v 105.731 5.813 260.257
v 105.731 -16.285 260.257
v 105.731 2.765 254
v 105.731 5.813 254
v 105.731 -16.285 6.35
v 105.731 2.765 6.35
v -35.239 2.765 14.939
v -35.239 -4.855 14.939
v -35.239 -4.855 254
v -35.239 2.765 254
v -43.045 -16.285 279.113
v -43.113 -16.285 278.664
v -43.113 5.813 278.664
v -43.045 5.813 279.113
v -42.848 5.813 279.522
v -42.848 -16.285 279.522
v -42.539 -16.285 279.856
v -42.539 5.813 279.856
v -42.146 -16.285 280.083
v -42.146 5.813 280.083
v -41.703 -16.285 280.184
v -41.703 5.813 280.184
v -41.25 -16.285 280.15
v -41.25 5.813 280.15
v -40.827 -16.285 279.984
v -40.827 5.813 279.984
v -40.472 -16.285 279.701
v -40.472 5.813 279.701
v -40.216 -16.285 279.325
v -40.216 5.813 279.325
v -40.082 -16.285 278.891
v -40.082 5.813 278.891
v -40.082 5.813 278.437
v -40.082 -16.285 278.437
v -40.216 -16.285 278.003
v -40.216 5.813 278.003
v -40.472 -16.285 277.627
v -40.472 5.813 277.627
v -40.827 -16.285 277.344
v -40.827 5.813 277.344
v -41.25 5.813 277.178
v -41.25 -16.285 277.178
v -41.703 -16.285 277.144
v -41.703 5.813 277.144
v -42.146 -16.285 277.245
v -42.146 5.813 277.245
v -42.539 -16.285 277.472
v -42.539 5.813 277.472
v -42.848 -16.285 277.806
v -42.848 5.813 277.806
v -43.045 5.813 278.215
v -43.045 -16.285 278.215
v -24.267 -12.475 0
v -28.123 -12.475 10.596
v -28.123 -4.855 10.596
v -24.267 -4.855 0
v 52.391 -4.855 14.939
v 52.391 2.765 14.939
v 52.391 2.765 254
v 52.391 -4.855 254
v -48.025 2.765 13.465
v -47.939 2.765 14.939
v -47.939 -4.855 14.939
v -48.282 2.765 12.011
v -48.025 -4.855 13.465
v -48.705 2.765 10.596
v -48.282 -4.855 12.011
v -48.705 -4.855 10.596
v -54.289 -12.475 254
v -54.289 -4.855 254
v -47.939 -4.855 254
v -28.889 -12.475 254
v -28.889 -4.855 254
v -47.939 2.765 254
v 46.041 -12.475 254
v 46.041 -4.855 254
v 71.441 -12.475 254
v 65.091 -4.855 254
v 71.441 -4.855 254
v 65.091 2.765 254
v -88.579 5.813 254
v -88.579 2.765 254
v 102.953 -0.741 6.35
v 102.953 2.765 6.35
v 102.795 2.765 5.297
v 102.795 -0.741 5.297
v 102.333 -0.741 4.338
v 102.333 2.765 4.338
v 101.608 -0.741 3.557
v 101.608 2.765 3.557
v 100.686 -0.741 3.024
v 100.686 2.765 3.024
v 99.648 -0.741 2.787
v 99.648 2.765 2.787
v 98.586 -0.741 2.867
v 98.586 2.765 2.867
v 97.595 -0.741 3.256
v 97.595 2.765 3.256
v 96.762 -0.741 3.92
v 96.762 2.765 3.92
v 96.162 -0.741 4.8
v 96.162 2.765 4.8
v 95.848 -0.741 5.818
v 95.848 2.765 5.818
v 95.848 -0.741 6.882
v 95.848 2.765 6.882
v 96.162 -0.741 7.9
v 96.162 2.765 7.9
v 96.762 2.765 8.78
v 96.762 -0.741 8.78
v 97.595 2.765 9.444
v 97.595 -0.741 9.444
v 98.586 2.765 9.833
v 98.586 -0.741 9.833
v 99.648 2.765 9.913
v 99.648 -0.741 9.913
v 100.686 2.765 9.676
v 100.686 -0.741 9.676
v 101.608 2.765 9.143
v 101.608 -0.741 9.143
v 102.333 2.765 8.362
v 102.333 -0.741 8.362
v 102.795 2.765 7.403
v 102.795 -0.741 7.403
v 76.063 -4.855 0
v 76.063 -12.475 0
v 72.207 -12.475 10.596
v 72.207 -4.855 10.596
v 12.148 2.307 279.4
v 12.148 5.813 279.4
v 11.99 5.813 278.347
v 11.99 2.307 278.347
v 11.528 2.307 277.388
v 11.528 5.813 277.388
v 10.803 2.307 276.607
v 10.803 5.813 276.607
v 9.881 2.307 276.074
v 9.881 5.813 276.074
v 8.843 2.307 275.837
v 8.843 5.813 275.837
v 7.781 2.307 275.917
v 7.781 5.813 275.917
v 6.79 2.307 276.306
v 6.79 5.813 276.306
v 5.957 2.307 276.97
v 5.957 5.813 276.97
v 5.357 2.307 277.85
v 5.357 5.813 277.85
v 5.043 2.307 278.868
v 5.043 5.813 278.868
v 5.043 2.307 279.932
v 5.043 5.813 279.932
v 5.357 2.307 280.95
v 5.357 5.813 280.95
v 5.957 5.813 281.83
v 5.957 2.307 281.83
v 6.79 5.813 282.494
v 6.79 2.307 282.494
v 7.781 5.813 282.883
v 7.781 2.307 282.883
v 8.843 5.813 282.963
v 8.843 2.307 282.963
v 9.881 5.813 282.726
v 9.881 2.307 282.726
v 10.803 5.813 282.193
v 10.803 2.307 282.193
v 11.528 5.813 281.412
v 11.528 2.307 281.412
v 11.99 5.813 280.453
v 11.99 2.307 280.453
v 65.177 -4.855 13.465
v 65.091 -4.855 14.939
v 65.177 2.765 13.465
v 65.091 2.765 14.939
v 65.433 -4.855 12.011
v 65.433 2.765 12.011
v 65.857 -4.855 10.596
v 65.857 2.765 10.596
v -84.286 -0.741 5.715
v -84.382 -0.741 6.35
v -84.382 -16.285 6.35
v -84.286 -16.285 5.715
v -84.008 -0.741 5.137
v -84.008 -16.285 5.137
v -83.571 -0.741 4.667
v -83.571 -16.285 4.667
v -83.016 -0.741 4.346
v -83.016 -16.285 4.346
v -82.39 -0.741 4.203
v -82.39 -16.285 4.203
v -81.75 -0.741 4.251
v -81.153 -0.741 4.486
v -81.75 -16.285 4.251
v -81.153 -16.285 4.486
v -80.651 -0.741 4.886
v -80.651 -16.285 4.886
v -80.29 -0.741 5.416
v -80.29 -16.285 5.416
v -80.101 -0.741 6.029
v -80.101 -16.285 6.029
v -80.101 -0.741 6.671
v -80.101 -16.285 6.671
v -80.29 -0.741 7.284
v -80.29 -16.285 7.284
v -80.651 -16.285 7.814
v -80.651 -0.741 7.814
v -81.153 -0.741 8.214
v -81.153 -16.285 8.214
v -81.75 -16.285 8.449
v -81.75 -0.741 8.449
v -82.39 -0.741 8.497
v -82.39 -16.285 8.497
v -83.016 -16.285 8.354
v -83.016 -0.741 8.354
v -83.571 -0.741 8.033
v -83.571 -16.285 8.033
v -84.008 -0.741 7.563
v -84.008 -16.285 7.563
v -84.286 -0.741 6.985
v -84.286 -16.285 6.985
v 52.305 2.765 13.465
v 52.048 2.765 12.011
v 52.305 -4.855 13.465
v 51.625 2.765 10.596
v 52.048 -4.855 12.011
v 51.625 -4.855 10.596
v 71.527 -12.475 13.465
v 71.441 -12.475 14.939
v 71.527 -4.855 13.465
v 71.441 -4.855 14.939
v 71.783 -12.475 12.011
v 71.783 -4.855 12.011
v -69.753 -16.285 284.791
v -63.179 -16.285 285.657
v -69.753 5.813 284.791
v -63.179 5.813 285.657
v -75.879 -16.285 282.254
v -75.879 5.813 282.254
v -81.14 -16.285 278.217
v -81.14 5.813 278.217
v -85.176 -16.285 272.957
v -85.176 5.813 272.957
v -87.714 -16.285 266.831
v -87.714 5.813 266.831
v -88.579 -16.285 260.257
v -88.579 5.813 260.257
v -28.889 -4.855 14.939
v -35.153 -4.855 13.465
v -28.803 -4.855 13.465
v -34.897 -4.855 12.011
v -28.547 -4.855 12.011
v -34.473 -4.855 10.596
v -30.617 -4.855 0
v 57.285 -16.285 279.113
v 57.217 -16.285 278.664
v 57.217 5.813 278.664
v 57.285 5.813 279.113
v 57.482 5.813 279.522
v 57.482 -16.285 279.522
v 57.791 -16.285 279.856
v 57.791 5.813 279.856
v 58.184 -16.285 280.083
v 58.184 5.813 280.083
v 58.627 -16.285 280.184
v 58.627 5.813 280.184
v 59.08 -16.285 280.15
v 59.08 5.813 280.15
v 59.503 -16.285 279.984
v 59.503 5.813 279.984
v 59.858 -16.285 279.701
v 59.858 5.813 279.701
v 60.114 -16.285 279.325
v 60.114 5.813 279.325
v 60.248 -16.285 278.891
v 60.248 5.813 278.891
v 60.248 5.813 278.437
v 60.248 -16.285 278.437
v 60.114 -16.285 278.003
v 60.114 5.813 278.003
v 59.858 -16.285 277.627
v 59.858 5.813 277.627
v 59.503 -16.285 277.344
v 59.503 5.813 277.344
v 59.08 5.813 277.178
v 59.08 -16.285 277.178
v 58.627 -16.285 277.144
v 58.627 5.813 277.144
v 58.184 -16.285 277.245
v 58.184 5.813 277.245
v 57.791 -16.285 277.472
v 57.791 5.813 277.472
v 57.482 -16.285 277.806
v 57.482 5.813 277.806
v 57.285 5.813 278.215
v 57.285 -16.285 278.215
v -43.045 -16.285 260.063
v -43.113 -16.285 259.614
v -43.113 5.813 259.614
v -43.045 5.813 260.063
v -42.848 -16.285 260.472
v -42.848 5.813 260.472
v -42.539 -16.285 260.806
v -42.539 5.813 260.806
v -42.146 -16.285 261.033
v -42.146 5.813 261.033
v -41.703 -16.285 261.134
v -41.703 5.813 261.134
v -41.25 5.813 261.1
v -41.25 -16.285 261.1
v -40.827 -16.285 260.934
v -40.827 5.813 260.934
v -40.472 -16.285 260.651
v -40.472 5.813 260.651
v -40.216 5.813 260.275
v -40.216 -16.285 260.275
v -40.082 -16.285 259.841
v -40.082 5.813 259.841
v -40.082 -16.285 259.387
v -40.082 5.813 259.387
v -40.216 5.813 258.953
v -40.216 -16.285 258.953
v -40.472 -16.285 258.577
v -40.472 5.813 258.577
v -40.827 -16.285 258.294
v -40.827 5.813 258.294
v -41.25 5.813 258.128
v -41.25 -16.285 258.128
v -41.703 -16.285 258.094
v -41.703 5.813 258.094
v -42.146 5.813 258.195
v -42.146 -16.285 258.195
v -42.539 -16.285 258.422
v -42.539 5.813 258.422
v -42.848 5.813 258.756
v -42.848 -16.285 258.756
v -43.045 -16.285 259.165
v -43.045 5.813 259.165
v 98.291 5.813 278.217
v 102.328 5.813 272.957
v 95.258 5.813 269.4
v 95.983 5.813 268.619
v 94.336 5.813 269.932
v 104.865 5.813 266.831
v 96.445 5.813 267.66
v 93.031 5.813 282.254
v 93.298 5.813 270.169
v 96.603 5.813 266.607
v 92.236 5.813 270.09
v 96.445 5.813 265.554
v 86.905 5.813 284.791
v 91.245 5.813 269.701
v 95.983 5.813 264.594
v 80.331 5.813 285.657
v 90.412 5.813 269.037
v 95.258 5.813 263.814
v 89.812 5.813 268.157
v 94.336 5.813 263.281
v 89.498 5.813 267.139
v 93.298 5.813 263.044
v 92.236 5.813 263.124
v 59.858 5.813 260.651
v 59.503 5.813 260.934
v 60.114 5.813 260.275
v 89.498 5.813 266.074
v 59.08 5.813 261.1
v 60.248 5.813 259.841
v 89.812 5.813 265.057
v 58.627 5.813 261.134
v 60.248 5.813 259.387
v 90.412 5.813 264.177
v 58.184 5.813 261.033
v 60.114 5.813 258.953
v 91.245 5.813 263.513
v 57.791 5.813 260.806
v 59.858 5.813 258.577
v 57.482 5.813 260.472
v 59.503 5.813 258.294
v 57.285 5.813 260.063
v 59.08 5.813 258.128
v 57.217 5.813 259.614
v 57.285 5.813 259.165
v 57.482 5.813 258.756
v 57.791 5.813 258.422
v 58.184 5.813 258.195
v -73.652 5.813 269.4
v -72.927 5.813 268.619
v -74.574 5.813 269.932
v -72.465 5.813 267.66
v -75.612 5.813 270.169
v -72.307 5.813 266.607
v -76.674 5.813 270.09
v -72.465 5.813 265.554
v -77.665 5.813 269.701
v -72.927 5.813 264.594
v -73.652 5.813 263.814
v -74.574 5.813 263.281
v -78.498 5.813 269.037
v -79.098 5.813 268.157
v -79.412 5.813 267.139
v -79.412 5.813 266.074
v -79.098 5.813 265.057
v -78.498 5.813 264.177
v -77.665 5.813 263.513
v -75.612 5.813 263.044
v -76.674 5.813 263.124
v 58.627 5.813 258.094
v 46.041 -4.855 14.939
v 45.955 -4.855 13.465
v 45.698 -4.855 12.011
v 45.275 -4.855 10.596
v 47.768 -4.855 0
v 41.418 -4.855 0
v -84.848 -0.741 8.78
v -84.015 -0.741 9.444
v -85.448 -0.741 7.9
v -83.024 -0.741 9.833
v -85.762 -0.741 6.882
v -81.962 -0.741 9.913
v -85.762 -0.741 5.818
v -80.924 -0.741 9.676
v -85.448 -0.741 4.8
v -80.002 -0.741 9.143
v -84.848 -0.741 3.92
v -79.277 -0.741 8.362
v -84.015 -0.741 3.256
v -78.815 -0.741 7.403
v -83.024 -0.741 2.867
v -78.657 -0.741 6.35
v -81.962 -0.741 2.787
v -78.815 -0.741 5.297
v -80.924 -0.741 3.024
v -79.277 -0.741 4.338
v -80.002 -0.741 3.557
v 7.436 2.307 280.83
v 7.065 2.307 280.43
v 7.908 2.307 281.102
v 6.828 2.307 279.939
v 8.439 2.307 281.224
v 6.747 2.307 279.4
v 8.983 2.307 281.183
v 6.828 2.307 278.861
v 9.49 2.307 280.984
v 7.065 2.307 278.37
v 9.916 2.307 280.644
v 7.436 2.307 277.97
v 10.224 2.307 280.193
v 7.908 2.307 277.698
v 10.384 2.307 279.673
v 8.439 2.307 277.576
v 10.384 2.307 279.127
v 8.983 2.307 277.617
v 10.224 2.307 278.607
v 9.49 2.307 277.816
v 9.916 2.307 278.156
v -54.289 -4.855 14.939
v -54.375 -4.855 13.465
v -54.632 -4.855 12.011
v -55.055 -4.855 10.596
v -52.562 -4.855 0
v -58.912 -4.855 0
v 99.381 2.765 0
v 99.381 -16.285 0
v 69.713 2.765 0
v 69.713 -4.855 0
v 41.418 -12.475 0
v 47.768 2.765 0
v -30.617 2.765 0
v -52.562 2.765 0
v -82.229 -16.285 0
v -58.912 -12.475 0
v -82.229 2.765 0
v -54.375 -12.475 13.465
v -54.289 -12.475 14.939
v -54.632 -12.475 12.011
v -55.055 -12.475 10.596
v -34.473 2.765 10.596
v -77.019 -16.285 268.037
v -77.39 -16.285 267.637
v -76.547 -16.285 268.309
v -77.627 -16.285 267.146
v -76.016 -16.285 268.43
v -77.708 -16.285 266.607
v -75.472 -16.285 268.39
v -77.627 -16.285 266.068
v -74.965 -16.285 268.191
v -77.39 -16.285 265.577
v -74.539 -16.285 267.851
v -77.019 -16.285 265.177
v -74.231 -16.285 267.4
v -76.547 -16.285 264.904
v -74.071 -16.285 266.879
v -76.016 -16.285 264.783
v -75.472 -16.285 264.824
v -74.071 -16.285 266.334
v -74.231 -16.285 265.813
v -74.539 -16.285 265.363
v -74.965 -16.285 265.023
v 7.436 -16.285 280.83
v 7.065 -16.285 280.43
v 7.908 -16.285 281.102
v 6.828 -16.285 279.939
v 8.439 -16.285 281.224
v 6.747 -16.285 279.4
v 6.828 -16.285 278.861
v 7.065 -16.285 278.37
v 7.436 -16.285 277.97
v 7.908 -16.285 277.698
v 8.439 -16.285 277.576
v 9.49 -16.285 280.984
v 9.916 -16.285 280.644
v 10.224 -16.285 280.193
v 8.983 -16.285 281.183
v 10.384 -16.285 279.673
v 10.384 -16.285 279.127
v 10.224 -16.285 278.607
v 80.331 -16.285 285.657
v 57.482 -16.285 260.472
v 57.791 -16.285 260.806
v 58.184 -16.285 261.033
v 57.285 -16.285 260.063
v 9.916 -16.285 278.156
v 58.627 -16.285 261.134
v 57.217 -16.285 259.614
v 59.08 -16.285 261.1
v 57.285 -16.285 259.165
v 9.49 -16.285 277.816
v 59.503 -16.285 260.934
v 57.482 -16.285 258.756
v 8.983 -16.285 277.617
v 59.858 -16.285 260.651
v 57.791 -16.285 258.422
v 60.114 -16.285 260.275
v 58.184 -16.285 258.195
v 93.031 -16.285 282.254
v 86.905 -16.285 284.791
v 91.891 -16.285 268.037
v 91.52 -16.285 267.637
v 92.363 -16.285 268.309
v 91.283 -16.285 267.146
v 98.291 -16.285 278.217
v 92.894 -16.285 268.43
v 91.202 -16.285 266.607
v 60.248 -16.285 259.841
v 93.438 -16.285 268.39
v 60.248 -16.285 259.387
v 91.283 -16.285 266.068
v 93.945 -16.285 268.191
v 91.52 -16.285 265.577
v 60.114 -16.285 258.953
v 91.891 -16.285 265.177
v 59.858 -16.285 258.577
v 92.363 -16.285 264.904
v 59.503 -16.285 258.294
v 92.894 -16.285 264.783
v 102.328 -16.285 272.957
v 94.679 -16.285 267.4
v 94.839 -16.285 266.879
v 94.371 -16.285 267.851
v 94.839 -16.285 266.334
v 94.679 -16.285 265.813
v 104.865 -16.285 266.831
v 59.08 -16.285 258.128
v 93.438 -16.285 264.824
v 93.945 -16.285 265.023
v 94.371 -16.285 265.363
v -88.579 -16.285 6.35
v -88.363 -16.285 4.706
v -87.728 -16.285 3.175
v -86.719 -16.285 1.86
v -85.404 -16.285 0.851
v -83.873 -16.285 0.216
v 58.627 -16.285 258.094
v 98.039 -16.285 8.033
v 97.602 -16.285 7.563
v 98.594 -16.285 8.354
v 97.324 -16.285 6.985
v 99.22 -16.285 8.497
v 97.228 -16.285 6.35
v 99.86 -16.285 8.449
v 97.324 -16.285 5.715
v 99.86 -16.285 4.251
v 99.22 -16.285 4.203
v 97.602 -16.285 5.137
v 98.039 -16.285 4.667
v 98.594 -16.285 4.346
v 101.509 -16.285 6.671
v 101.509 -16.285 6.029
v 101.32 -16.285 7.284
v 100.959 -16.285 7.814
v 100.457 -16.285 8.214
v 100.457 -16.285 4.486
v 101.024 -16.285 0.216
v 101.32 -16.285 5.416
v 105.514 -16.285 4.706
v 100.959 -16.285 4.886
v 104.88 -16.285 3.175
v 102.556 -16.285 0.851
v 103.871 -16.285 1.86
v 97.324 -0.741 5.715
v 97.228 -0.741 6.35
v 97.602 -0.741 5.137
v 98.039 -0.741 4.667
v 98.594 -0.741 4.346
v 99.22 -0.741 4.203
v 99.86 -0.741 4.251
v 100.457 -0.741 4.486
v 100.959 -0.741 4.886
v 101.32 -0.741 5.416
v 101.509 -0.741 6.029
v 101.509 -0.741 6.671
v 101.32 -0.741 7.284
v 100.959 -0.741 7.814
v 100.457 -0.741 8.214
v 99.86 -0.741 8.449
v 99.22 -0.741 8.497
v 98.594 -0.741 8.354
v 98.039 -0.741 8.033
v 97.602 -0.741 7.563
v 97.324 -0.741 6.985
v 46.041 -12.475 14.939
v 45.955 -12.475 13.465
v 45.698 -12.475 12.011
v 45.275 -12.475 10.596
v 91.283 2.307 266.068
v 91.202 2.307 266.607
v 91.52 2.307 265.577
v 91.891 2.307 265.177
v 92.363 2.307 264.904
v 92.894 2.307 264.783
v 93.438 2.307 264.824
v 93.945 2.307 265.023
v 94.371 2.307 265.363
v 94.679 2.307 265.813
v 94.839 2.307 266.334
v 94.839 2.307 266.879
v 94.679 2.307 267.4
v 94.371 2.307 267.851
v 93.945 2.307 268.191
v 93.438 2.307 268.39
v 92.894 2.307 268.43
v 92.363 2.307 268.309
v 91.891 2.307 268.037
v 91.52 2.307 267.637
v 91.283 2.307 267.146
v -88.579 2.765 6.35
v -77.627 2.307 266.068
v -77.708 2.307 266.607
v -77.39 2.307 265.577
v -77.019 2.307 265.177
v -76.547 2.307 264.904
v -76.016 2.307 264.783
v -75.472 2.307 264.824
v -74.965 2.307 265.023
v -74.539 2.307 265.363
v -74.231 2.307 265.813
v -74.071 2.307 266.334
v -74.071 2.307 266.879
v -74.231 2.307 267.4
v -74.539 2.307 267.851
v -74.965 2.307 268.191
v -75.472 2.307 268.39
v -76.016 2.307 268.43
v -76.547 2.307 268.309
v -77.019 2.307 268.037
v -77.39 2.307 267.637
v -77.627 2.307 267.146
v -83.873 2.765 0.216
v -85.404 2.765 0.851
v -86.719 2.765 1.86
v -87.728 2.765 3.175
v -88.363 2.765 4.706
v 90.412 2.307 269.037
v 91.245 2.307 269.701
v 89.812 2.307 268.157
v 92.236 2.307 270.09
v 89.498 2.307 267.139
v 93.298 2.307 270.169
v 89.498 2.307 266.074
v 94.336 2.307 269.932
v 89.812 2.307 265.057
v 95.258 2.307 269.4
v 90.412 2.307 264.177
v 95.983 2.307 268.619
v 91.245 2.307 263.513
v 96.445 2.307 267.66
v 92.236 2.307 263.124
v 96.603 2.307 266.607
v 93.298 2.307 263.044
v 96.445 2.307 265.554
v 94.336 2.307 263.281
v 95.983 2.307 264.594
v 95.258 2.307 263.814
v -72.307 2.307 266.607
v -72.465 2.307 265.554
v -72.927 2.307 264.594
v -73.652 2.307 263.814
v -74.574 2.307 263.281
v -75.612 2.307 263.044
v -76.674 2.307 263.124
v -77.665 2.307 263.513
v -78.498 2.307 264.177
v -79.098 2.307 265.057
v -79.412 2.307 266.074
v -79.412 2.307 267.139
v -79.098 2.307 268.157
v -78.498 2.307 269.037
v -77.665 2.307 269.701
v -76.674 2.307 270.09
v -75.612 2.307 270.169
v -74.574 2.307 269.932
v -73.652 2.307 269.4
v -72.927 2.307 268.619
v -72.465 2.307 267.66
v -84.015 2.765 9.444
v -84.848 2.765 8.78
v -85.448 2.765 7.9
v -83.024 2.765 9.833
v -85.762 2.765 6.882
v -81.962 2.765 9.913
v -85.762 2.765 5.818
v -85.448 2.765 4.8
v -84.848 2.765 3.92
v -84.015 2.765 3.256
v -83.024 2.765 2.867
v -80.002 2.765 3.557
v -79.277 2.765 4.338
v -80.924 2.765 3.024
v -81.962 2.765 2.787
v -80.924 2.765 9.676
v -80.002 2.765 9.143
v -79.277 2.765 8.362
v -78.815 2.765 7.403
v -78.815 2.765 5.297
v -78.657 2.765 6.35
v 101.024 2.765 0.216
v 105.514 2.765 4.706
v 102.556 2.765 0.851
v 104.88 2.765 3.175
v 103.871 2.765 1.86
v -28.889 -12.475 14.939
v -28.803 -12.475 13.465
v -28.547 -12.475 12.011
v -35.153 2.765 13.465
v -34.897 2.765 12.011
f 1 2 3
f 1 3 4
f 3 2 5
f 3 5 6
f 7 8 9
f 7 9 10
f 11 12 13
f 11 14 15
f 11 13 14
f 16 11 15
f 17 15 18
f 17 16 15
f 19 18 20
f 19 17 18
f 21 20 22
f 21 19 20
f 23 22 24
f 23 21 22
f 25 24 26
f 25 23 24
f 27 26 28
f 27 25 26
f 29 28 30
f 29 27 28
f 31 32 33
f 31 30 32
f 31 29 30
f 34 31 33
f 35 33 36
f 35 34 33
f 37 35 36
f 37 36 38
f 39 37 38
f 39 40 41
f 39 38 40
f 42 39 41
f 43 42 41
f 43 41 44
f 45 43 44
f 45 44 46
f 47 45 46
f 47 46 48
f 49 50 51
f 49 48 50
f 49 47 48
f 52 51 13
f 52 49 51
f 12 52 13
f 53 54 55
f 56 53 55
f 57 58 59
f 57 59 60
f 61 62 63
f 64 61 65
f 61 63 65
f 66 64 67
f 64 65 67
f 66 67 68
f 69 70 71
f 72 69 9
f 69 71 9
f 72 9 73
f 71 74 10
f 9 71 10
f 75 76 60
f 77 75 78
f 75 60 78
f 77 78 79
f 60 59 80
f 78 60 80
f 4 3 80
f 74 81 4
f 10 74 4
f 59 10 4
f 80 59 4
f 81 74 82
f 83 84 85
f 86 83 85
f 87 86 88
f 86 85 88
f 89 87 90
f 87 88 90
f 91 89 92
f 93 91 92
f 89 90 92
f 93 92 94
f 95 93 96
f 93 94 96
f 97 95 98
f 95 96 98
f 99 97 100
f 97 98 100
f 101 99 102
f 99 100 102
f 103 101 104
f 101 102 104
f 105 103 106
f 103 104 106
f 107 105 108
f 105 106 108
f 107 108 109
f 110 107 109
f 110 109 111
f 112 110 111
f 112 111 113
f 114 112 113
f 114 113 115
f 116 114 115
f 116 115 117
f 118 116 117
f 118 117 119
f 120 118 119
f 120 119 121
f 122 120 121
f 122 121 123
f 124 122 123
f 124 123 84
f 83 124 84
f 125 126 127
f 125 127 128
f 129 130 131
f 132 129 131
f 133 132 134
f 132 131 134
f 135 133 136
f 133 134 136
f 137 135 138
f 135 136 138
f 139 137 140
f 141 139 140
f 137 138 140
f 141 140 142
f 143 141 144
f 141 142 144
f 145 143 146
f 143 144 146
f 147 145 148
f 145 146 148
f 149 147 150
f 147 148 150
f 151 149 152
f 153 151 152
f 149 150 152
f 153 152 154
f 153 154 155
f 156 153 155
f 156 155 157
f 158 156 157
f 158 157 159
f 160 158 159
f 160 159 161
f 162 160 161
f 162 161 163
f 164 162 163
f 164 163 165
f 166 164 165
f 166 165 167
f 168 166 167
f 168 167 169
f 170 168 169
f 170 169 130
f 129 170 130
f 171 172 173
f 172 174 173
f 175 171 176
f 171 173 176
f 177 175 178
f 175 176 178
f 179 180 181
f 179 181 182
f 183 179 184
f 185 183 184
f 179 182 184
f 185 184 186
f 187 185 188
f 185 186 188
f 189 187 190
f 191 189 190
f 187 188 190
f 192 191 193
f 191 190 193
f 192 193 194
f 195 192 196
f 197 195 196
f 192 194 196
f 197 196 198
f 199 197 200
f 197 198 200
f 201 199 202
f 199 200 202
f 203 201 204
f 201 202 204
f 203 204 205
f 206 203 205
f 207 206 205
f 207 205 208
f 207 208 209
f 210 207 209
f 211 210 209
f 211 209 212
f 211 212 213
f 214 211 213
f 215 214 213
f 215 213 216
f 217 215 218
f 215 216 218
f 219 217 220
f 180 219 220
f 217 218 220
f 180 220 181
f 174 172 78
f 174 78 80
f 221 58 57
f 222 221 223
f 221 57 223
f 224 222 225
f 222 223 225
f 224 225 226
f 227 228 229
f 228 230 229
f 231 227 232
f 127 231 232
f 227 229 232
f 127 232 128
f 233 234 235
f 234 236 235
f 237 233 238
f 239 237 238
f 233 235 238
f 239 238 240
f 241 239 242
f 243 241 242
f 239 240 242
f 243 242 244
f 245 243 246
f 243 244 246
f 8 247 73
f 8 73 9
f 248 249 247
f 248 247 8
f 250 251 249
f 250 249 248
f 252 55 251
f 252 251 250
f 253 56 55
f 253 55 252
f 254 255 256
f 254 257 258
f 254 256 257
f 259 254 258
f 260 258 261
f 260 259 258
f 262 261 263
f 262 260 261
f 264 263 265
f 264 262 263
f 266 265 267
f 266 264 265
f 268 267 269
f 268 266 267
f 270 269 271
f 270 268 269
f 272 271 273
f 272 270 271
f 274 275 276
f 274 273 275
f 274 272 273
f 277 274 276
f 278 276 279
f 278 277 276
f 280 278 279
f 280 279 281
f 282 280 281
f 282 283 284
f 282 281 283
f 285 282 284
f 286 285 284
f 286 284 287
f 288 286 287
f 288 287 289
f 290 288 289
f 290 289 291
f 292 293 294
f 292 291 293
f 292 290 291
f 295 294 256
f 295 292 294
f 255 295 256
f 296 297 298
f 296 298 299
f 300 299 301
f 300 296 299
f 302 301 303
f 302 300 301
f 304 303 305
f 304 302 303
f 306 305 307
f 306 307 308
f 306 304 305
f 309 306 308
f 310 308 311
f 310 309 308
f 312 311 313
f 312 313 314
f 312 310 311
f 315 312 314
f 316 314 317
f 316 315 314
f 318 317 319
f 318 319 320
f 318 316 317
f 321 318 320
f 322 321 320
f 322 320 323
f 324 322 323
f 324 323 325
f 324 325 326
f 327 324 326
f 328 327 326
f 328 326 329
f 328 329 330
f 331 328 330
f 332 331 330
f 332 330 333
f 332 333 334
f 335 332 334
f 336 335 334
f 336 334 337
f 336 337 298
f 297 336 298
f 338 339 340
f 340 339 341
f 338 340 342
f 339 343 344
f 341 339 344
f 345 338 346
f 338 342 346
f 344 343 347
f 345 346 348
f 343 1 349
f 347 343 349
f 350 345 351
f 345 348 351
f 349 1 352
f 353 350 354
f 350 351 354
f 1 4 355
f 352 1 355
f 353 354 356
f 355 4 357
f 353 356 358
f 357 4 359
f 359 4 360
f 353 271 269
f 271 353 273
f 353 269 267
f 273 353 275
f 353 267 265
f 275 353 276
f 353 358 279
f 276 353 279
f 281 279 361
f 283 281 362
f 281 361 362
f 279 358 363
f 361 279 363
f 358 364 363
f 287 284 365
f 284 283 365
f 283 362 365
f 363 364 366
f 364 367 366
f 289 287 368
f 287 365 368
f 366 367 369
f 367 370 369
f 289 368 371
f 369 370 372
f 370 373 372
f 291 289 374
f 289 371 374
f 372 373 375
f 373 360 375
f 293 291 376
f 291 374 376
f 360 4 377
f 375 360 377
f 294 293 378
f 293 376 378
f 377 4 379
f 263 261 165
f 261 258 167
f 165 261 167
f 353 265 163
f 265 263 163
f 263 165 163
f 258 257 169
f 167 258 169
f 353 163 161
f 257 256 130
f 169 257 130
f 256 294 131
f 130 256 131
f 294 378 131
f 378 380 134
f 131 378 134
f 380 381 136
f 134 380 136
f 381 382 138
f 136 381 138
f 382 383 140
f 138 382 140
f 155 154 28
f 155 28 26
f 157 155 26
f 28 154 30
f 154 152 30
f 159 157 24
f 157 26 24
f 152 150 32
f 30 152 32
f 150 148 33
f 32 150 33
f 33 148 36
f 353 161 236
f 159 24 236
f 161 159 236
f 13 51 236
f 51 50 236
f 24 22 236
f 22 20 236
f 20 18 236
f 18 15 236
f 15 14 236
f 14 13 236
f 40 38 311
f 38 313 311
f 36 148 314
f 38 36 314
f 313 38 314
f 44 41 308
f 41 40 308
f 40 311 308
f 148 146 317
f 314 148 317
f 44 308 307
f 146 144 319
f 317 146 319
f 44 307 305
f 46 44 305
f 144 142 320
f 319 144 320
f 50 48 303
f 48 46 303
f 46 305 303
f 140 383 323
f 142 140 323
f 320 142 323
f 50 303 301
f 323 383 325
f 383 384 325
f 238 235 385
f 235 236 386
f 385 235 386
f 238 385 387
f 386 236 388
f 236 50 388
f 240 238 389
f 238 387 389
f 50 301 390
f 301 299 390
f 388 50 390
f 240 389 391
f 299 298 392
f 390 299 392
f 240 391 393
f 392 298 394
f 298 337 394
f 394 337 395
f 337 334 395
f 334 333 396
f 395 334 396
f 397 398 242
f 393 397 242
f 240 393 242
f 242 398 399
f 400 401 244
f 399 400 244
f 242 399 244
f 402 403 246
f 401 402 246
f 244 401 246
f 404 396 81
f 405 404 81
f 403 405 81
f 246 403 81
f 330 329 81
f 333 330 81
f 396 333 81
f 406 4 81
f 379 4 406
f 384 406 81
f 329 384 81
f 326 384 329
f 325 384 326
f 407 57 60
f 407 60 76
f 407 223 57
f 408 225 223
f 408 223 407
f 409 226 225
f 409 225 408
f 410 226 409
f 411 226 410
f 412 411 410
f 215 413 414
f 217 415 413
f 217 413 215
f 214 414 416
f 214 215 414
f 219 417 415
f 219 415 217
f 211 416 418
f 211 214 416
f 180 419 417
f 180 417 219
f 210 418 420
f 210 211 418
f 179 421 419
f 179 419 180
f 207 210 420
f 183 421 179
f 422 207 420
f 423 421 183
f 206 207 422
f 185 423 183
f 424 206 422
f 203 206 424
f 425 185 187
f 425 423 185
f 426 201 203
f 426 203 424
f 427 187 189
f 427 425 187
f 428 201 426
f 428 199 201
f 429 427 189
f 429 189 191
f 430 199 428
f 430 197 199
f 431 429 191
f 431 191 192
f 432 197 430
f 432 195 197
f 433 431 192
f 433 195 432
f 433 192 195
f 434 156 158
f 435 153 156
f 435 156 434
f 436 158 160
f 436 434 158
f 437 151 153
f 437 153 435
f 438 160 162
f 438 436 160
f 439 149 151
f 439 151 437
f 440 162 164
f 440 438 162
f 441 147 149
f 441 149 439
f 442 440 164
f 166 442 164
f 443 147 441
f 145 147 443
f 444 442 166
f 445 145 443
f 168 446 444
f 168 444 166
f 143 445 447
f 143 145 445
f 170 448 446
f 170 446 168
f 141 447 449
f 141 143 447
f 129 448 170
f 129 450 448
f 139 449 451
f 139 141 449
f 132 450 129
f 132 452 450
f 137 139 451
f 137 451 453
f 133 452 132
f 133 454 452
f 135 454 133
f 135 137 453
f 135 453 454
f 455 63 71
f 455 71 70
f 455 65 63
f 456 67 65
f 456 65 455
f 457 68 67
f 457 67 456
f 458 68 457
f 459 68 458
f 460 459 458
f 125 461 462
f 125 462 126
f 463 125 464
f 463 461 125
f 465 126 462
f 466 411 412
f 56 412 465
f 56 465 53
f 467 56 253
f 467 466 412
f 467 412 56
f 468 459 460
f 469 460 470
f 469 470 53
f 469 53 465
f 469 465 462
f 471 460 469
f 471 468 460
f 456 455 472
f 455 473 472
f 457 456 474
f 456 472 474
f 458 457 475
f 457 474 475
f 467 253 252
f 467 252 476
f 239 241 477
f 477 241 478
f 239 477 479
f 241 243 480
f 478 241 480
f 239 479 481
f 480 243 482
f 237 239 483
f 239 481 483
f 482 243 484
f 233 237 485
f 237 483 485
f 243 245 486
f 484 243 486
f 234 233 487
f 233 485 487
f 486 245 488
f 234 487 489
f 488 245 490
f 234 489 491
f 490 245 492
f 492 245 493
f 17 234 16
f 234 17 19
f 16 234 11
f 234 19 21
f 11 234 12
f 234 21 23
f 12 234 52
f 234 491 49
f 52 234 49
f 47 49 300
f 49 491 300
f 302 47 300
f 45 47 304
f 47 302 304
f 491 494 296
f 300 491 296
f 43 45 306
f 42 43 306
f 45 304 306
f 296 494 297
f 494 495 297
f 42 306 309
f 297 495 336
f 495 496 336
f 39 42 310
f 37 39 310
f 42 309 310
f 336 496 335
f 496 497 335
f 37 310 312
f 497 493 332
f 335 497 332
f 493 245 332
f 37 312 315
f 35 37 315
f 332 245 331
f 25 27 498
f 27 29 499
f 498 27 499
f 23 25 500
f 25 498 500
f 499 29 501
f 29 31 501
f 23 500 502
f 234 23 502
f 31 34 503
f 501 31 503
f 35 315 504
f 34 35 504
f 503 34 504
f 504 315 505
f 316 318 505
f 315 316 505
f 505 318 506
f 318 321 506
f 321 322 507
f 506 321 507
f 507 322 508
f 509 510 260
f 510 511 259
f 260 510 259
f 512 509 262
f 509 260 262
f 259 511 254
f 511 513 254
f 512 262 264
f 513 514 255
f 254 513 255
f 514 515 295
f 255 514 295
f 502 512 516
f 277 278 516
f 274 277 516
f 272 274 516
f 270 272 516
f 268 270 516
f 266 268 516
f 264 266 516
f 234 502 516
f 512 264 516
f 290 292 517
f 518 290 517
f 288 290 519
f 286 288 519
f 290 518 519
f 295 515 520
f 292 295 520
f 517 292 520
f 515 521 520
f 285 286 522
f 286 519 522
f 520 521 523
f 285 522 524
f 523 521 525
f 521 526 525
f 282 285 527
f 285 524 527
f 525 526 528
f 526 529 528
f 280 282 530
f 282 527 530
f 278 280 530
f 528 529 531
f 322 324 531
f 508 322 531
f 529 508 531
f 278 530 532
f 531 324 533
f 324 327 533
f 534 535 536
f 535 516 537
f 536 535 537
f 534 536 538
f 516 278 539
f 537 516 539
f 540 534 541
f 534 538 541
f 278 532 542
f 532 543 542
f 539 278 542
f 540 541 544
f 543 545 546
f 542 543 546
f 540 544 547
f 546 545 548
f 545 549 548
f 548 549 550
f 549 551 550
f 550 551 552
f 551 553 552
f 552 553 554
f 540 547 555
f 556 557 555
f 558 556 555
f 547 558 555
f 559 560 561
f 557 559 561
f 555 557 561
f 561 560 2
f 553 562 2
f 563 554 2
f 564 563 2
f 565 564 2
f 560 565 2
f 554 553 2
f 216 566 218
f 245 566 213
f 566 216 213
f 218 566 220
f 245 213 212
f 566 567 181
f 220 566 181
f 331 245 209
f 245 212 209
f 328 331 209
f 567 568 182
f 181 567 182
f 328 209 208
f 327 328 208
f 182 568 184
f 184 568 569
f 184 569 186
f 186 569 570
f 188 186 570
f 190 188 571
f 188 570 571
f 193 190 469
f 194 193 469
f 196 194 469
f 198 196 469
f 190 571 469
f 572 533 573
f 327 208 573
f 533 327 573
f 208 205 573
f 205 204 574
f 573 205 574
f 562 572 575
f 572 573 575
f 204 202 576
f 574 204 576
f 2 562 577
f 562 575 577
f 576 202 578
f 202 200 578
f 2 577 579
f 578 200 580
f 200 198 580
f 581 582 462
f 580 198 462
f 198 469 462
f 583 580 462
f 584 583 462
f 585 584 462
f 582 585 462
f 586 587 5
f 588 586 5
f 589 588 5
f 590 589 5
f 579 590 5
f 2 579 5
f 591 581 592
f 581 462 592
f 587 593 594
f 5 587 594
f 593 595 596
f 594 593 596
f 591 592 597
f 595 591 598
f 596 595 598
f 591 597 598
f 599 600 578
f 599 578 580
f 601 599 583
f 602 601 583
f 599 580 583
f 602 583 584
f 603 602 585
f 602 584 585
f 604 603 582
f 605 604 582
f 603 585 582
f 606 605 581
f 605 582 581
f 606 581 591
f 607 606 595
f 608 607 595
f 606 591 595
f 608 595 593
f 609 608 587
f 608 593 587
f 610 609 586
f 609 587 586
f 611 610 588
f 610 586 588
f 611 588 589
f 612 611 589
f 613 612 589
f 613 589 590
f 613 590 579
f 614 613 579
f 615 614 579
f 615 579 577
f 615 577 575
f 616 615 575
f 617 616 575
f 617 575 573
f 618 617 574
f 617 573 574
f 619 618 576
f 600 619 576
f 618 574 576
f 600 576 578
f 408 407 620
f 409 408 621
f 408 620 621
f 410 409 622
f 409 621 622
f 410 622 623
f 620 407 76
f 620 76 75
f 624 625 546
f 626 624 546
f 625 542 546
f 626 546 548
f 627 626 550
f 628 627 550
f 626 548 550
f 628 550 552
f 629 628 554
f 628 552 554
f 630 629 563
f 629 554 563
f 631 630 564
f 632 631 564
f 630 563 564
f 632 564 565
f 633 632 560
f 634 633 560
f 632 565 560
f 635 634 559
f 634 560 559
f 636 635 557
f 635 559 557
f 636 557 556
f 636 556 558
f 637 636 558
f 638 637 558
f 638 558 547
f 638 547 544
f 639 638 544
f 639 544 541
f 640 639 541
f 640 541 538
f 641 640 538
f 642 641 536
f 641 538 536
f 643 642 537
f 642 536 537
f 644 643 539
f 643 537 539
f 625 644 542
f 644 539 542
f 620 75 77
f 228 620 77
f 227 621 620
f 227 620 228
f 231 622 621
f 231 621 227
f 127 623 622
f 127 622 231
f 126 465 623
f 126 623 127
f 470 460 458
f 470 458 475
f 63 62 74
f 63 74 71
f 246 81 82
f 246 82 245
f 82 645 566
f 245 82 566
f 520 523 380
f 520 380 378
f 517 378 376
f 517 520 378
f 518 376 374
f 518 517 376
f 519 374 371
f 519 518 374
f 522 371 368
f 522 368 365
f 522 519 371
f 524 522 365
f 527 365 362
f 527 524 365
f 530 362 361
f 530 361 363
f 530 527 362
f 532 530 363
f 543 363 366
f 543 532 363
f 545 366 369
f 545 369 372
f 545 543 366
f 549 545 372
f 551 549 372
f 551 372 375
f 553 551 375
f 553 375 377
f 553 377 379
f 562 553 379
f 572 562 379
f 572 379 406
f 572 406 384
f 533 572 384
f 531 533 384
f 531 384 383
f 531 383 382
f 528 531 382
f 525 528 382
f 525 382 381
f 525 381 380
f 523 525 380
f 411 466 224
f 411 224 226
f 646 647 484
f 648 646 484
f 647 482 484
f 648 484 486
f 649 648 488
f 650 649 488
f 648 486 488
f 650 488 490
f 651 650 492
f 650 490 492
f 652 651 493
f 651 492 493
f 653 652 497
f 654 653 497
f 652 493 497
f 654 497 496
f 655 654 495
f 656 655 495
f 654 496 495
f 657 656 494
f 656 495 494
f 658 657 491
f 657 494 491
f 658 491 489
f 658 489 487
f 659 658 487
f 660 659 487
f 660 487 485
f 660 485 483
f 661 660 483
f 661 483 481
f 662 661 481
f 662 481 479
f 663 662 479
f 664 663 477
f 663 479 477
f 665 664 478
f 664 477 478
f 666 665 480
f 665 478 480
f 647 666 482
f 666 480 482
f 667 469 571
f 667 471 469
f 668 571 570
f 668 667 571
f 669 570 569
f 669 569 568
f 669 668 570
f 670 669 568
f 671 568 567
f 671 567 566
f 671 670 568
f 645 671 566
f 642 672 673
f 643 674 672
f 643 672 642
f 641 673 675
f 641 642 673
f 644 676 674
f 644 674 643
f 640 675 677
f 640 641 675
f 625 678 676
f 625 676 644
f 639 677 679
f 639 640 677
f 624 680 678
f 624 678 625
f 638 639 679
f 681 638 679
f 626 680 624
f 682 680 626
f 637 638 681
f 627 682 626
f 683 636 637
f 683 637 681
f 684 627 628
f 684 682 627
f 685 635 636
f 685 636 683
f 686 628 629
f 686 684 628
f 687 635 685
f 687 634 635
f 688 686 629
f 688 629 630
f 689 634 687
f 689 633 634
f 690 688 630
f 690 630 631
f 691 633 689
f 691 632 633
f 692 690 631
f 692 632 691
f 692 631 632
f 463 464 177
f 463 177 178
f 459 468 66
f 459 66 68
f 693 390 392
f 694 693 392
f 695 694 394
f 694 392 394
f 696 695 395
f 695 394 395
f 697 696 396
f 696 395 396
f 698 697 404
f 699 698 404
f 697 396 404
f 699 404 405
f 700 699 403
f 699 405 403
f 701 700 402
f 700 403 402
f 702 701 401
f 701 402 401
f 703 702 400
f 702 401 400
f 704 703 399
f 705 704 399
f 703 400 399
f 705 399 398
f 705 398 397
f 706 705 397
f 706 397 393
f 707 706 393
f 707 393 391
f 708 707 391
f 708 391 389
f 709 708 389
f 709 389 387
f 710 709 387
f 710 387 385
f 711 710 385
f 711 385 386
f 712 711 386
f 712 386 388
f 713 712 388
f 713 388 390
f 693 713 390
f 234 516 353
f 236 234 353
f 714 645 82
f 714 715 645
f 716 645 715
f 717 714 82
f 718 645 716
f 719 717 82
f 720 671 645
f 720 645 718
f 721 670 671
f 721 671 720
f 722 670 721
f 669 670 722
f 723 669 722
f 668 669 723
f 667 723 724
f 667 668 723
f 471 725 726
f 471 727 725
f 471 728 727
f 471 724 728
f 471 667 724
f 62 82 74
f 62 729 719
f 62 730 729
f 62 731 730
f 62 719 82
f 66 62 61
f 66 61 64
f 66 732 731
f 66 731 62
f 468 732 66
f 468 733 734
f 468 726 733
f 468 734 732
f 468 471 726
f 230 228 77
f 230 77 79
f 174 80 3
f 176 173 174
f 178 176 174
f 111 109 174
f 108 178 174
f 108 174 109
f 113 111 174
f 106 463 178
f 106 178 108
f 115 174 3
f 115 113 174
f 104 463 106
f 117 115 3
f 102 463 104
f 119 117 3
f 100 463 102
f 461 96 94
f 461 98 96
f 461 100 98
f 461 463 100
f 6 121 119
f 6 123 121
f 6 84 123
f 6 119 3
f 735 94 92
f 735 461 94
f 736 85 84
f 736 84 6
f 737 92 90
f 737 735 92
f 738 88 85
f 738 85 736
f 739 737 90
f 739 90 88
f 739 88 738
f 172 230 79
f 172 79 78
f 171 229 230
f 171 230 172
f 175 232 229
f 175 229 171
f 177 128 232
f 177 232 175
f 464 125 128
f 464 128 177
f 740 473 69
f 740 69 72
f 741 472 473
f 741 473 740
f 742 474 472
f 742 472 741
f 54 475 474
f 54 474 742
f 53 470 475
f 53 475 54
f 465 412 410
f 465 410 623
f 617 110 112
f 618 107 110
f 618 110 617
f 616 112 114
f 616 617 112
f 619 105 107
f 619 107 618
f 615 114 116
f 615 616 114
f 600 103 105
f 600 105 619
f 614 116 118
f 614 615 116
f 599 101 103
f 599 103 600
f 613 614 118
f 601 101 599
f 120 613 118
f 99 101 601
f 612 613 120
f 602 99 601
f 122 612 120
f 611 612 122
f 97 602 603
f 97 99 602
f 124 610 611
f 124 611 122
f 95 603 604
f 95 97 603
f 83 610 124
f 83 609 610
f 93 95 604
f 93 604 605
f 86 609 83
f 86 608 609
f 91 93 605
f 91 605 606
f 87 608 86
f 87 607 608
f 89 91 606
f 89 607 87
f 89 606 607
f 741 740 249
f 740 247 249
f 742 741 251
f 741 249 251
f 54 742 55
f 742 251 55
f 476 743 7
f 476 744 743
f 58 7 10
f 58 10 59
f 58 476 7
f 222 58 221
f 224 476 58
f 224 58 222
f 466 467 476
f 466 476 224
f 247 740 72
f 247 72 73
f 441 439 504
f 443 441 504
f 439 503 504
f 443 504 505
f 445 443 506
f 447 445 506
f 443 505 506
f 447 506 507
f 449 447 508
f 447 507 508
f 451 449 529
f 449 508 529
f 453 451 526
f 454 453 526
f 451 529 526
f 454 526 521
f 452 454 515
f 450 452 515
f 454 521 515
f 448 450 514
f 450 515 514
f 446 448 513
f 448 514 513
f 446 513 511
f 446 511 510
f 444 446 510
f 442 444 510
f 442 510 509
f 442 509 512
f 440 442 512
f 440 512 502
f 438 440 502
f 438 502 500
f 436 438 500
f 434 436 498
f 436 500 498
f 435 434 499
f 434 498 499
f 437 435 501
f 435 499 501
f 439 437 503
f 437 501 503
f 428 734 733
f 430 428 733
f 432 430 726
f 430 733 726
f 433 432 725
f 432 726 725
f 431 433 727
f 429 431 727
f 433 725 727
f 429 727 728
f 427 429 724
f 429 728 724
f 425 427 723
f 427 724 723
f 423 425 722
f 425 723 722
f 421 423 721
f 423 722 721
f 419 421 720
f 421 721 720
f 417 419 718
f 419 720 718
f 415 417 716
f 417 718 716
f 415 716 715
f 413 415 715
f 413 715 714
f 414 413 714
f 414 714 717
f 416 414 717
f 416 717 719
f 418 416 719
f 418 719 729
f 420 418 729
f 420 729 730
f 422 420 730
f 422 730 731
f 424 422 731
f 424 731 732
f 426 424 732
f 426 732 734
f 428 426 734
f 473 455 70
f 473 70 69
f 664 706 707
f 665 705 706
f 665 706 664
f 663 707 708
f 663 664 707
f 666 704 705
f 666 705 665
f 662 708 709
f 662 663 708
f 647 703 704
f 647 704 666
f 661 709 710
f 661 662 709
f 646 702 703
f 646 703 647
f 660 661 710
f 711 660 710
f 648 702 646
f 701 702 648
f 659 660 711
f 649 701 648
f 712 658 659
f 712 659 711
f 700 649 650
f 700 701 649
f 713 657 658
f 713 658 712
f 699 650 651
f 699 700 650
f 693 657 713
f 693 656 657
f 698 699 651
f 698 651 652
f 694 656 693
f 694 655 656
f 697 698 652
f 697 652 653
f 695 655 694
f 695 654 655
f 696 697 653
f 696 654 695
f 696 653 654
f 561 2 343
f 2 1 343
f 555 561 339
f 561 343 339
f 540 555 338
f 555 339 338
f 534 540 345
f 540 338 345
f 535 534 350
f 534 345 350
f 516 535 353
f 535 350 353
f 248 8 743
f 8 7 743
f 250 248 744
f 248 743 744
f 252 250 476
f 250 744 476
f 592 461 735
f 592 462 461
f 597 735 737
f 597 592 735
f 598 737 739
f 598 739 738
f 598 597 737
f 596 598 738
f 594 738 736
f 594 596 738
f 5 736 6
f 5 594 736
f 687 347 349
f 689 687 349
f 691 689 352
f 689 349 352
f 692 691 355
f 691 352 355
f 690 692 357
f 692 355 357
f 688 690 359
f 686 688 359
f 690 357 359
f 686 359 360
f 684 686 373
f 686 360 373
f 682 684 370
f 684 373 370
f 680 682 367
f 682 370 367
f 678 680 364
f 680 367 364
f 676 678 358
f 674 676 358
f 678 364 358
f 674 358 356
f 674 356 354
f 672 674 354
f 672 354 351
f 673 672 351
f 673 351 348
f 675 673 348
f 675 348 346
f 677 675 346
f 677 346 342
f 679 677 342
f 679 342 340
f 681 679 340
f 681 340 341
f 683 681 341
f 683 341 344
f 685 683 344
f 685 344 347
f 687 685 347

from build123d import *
from OCP.BRepFilletAPI import BRepFilletAPI_MakeChamfer

# Parameters (mm, degrees)
BOSS_EXTRUDE1_DEPTH                            = 254
SKETCH2_W                                      = 194.31
SKETCH2_H                                      = 44.45
SKETCH2_W_2                                    = 35.56
SKETCH2_H_2                                    = 17.018
BOSS_EXTRUDE2_DEPTH                            = 6.35
BOSS_EXTRUDE3_DEPTH                            = 44.45
CUT_EXTRUDE1_DEPTH                             = 324.390875065
CUT_EXTRUDE1_DEPTH_BACK                        = 324.390875065
SKETCH5_R                                      = 1.524
FILLET1_R                                      = 3.175
FILLET2_R                                      = 3.175
CBORE_FOR_6_SOCKET_HEAD_CAP_SCREW1_D           = 4.3053
CBORE_FOR_6_SOCKET_HEAD_CAP_SCREW1_CBORE_D     = 7.14502
CBORE_FOR_6_SOCKET_HEAD_CAP_SCREW1_CBORE_DEPTH = 3.5052
CHAMFER1_SIZE                                  = 12.7
CHAMFER1_SIZE2                                 = 4.622421975
FILLET4_R                                      = 12.7
FILLET6_R                                      = 6.35
FILLET7_R                                      = 2.54
CUT_EXTRUDE2_DEPTH                             = 363.564005121
SKETCH13_W                                     = 19.143193239
SKETCH13_H                                     = 43.092698141
CUT_EXTRUDE3_DEPTH                             = 362.835089653
FILLET8_R                                      = 25.4
CBORE_FOR_6_SOCKET_HEAD_CAP_SCREW3_D           = 3.6576
CBORE_FOR_6_SOCKET_HEAD_CAP_SCREW3_CBORE_D     = 7.14502
CBORE_FOR_6_SOCKET_HEAD_CAP_SCREW3_CBORE_DEPTH = 3.5052
CBORE_FOR_6_SOCKET_HEAD_CAP_SCREW4_D           = 3.6576
CBORE_FOR_6_SOCKET_HEAD_CAP_SCREW4_CBORE_D     = 7.14502
CBORE_FOR_6_SOCKET_HEAD_CAP_SCREW4_CBORE_DEPTH = 3.5052


with BuildPart() as part:
    # Sketch1 → Boss-Extrude1 (new body)
    with BuildSketch(Plane.XY):
        Polygon((-88.579180599, 2.764546242), (-47.939180599, 2.764546242), (-47.939180599, -4.855453758), (-54.289180599, -4.855453758), (-54.289180599, -12.475453758), (-28.889180599, -12.475453758), (-28.889180599, -4.855453758), (-35.239180599, -4.855453758), (-35.239180599, 2.764546242), (5.400819401, 2.764546242), (5.400819401, 28.164546242), (11.750819401, 28.164546242), (11.750819401, 2.764546242), (52.390819401, 2.764546242), (52.390819401, -4.855453758), (46.040819401, -4.855453758), (46.040819401, -12.475453758), (71.440819401, -12.475453758), (71.440819401, -4.855453758), (65.090819401, -4.855453758), (65.090819401, 2.764546242), (105.730819401, 2.764546242), (105.730819401, -16.285453758), (-88.579180599, -16.285453758), align=None)
    extrude(amount=BOSS_EXTRUDE1_DEPTH)

    # Sketch2 → Boss-Extrude2 (add)
    with BuildSketch(Plane.XY.offset(254)):
        with Locations((8.575819401, 5.939546242)):
            Rectangle(SKETCH2_W, SKETCH2_H)
        with Locations((-41.589180599, 14.321546242)):
            Rectangle(SKETCH2_W_2, SKETCH2_H_2, mode=Mode.SUBTRACT)
        with Locations((58.740819401, 14.321546242)):
            Rectangle(SKETCH2_W_2, SKETCH2_H_2, mode=Mode.SUBTRACT)
    extrude(amount=BOSS_EXTRUDE2_DEPTH)

    # Sketch3 → Boss-Extrude3 (add)
    with BuildSketch(Plane.XY.offset(260.35)):
        Polygon((-88.579180599, 5.812546242), (-88.579180599, -16.285453758), (105.730819401, -16.285453758), (105.730819401, 5.812546242), (76.520819401, 5.812546242), (40.960819401, 5.812546242), (-23.809180599, 5.812546242), (-59.369180599, 5.812546242), align=None)
    extrude(amount=BOSS_EXTRUDE3_DEPTH)

    # Sketch5 → Cut-Extrude1 (cut, two sides: drawn at the far end of the back side and taken through both)
    with BuildSketch(Plane(origin=(0, 5.812546242, 0), x_dir=(1, 0, 0), z_dir=(0, 1, 0)).offset(-CUT_EXTRUDE1_DEPTH_BACK)):
        with Locations(Location((-41.589180599, -259.614, 0), (0, 0, 180))):
            Circle(SKETCH5_R)
        with Locations(Location((-41.589180599, -278.664, 0), (0, 0, 180))):
            Circle(SKETCH5_R)
        with Locations(Location((58.740819401, -259.614, 0), (0, 0, 180))):
            Circle(SKETCH5_R)
        with Locations(Location((58.740819401, -278.664, 0), (0, 0, 180))):
            Circle(SKETCH5_R)
    extrude(amount=CUT_EXTRUDE1_DEPTH + CUT_EXTRUDE1_DEPTH_BACK, mode=Mode.SUBTRACT)

    # Fillet1
    # the kernel refuses this fillet: 3.175 mm, written as the material it takes off along each edge
    with BuildSketch(Plane(origin=(5.400819401, 28.164546242, -7.9375), x_dir=(0, -1, 0), z_dir=(0, 0, 1))) as fillet1_piece_1:
        with BuildLine():
            CenterArc((FILLET1_R, FILLET1_R), FILLET1_R, 180, 90)
            Line((0, FILLET1_R), (0, 0))
            Line((0, 0), (FILLET1_R, 0))
        make_face()
    extrude(amount=261.9375, mode=Mode.SUBTRACT)
    with BuildSketch(Plane(origin=(11.750819401, 28.164546242, -7.9375), x_dir=(0, -1, 0), z_dir=(0, 0, 1))) as fillet1_piece_2:
        with BuildLine():
            CenterArc((FILLET1_R, -FILLET1_R), FILLET1_R, 90, 90)
            Line((0, -FILLET1_R), (0, 0))
            Line((0, 0), (FILLET1_R, 0))
        make_face()
    extrude(amount=261.9375, mode=Mode.SUBTRACT)

    # Fillet2
    # the kernel refuses this fillet: 3.175 mm, written as the material it adds along each edge
    # the kernel refuses this fillet: 3.175 mm, written as the material it takes off along each edge
    with BuildSketch(Plane(origin=(65.343823241, 28.164546242, 260.35), x_dir=(0, -1, 0), z_dir=(-1, 0, 0))) as fillet2_2_piece_1:
        with BuildLine():
            CenterArc((FILLET2_R, -FILLET2_R), FILLET2_R, 90, 90)
            Line((0, -FILLET2_R), (0, 0))
            Line((0, 0), (FILLET2_R, 0))
        make_face()
    extrude(amount=113.536007681, mode=Mode.SUBTRACT)
    with BuildSketch(Plane(origin=(113.668319401, 28.164546242, 260.35), x_dir=(0, -1, 0), z_dir=(-1, 0, 0)), Plane(origin=(-34.986176759, 28.164546242, 260.35), x_dir=(0, -1, 0), z_dir=(-1, 0, 0))) as fillet2_2_piece_2:
        with BuildLine():
            CenterArc((FILLET2_R, -FILLET2_R), FILLET2_R, 90, 90)
            Line((0, -FILLET2_R), (0, 0))
            Line((0, 0), (FILLET2_R, 0))
        make_face()
    extrude(amount=61.53050384, mode=Mode.SUBTRACT)
    with BuildSketch(Plane(origin=(-96.516680599, 28.164546242, 254), x_dir=(0, -1, 0), z_dir=(1, 0, 0))) as fillet2_2_piece_3_section:
        with BuildLine():
            CenterArc((FILLET2_R, -FILLET2_R), FILLET2_R, 90, 90)
            Line((0, -FILLET2_R), (0, 0))
            Line((0, 0), (FILLET2_R, 0))
        make_face()
    fillet2_2_piece_3 = extrude(amount=105.0925, mode=Mode.PRIVATE)
    fillet2_2_piece_3 = fillet2_2_piece_3 - Plane(origin=(8.575819401, 24.989546242, 254.709193206), x_dir=(0, -1, 0), z_dir=(0, 0, -1)) * Cylinder(3.175, 223, mode=Mode.PRIVATE)
    add(fillet2_2_piece_3, mode=Mode.SUBTRACT)

    # CBORE for #6 Socket Head Cap Screw1 (through all)
    with Locations(Plane(origin=(0, 2.764546242, 0), x_dir=(1, 0, 0), z_dir=(0, 1, 0))):
        with Locations((99.380819401, -6.35), (-82.229180599, -6.35)):
            CounterBoreHole(CBORE_FOR_6_SOCKET_HEAD_CAP_SCREW1_D / 2, CBORE_FOR_6_SOCKET_HEAD_CAP_SCREW1_CBORE_D / 2, CBORE_FOR_6_SOCKET_HEAD_CAP_SCREW1_CBORE_DEPTH)

    # Chamfer1: one chamfer whose edges measure the first distance from different faces: ONE call of the kernel's chamfer builder (chamfer() names one face for all edges)
    chamfer1_edges_1 = [part.edges().sort_by_distance(p)[0] for p in [
        (-47.939180599, -1.045453758, 0),
    ]]
    chamfer1_side_1 = [part.faces().sort_by_distance(p)[0] for p in [
        (-47.939180599, -1.045453758, 127),
    ]]
    chamfer1_edges_2 = [part.edges().sort_by_distance(p)[0] for p in [
        (-54.289180599, -8.665453758, 0),
    ]]
    chamfer1_side_2 = [part.faces().sort_by_distance(p)[0] for p in [
        (-54.289180599, -8.665453758, 127),
    ]]
    chamfer1_edges_3 = [part.edges().sort_by_distance(p)[0] for p in [
        (-28.889180599, -8.665453758, 0),
    ]]
    chamfer1_side_3 = [part.faces().sort_by_distance(p)[0] for p in [
        (-28.889180599, -8.665453758, 127),
    ]]
    chamfer1_edges_4 = [part.edges().sort_by_distance(p)[0] for p in [
        (-35.239180599, -1.045453758, 0),
    ]]
    chamfer1_side_4 = [part.faces().sort_by_distance(p)[0] for p in [
        (-35.239180599, -1.045453758, 127),
    ]]
    chamfer1_edges_5 = [part.edges().sort_by_distance(p)[0] for p in [
        (52.390819401, -1.045453758, 0),
    ]]
    chamfer1_side_5 = [part.faces().sort_by_distance(p)[0] for p in [
        (52.390819401, -1.045453758, 127),
    ]]
    chamfer1_edges_6 = [part.edges().sort_by_distance(p)[0] for p in [
        (46.040819401, -8.665453758, 0),
    ]]
    chamfer1_side_6 = [part.faces().sort_by_distance(p)[0] for p in [
        (46.040819401, -8.665453758, 127),
    ]]
    chamfer1_edges_7 = [part.edges().sort_by_distance(p)[0] for p in [
        (71.440819401, -8.665453758, 0),
    ]]
    chamfer1_side_7 = [part.faces().sort_by_distance(p)[0] for p in [
        (71.440819401, -8.665453758, 127),
    ]]
    chamfer1_edges_8 = [part.edges().sort_by_distance(p)[0] for p in [
        (65.090819401, -1.045453758, 0),
    ]]
    chamfer1_side_8 = [part.faces().sort_by_distance(p)[0] for p in [
        (65.090819401, -1.045453758, 127),
    ]]
    chamfer1 = BRepFilletAPI_MakeChamfer(part.part.solid().wrapped)
    for e in chamfer1_edges_1:
        chamfer1.Add(CHAMFER1_SIZE, CHAMFER1_SIZE2, e.wrapped, chamfer1_side_1[0].wrapped)  # the first distance lies on this face
    for e in chamfer1_edges_2:
        chamfer1.Add(CHAMFER1_SIZE, CHAMFER1_SIZE2, e.wrapped, chamfer1_side_2[0].wrapped)  # the first distance lies on this face
    for e in chamfer1_edges_3:
        chamfer1.Add(CHAMFER1_SIZE, CHAMFER1_SIZE2, e.wrapped, chamfer1_side_3[0].wrapped)  # the first distance lies on this face
    for e in chamfer1_edges_4:
        chamfer1.Add(CHAMFER1_SIZE, CHAMFER1_SIZE2, e.wrapped, chamfer1_side_4[0].wrapped)  # the first distance lies on this face
    for e in chamfer1_edges_5:
        chamfer1.Add(CHAMFER1_SIZE, CHAMFER1_SIZE2, e.wrapped, chamfer1_side_5[0].wrapped)  # the first distance lies on this face
    for e in chamfer1_edges_6:
        chamfer1.Add(CHAMFER1_SIZE, CHAMFER1_SIZE2, e.wrapped, chamfer1_side_6[0].wrapped)  # the first distance lies on this face
    for e in chamfer1_edges_7:
        chamfer1.Add(CHAMFER1_SIZE, CHAMFER1_SIZE2, e.wrapped, chamfer1_side_7[0].wrapped)  # the first distance lies on this face
    for e in chamfer1_edges_8:
        chamfer1.Add(CHAMFER1_SIZE, CHAMFER1_SIZE2, e.wrapped, chamfer1_side_8[0].wrapped)  # the first distance lies on this face
    add(Compound.cast(chamfer1.Shape()), mode=Mode.REPLACE)

    # Fillet4
    fillet4_edges = [part.edges().sort_by_distance(p)[0] for p in [
        (-28.889180599, -8.665453758, 12.7),
        (-35.239180599, -1.045453758, 12.7),
        (-47.939180599, -1.045453758, 12.7),
        (-54.289180599, -8.665453758, 12.7),
        (52.390819401, -1.045453758, 12.7),
        (46.040819401, -8.665453758, 12.7),
        (71.440819401, -8.665453758, 12.7),
        (65.090819401, -1.045453758, 12.7),
    ]]
    fillet(fillet4_edges, radius=FILLET4_R)

    # Fillet6
    fillet6_edges = [part.edges().sort_by_distance(p)[0] for p in [
        (105.730819401, -6.760453758, 0),
        (-88.579180599, -6.760453758, 0),
    ]]
    fillet(fillet6_edges, radius=FILLET6_R)

    # Fillet7
    fillet7_edges = [part.edges().sort_by_distance(p)[0] for p in [
        (5.400819401, 13.877046242, 0),
        (8.575819401, 28.164546242, 0),
        (11.750819401, 13.877046242, 0),
    ]]
    fillet(fillet7_edges, radius=FILLET7_R)

    # Sketch8 → Cut-Extrude2 (cut, through all)
    with BuildSketch(Plane(origin=(105.730819401, 0, 0), x_dir=(0, 0, -1), z_dir=(1, 0, 0))):
        Polygon((-254, 2.764546242), (3.999834261, 2.764546242), (3.999834261, 41.93274121), (-234.463494025, 41.93274121), (-234.463494025, 51.374436441), (-260.35, 51.374436441), (-260.35, 5.812546242), (-254, 5.812546242), align=None)
    extrude(amount=-CUT_EXTRUDE2_DEPTH, mode=Mode.SUBTRACT)

    # Sketch13 → Cut-Extrude3 (cut, through all)
    with BuildSketch(Plane(origin=(105.730819401, 0, 0), x_dir=(0, 0, -1), z_dir=(1, 0, 0))):
        with Locations((-295.228403381, 5.260895312)):
            Rectangle(SKETCH13_W, SKETCH13_H)
    extrude(amount=-CUT_EXTRUDE3_DEPTH, mode=Mode.SUBTRACT)

    # Fillet8
    fillet8_edges = [part.edges().sort_by_distance(p)[0] for p in [
        (-88.579180599, -5.236453758, 285.656806761),
        (105.730819401, -5.236453758, 285.656806761),
    ]]
    fillet(fillet8_edges, radius=FILLET8_R)

    # CBORE for #6 Socket Head Cap Screw3 (through all)
    with Locations(Plane(origin=(0, 5.812546242, 0), x_dir=(1, 0, 0), z_dir=(0, 1, 0))):
        with Locations((8.575819401, -279.4)):
            CounterBoreHole(CBORE_FOR_6_SOCKET_HEAD_CAP_SCREW3_D / 2, CBORE_FOR_6_SOCKET_HEAD_CAP_SCREW3_CBORE_D / 2, CBORE_FOR_6_SOCKET_HEAD_CAP_SCREW3_CBORE_DEPTH)

    # CBORE for #6 Socket Head Cap Screw4 (through all)
    with Locations(Plane(origin=(0, 5.812546242, 0), x_dir=(1, 0, 0), z_dir=(0, 1, 0))):
        with Locations((93.030819401, -266.606806761), (-75.879180599, -266.606806761)):
            CounterBoreHole(CBORE_FOR_6_SOCKET_HEAD_CAP_SCREW4_D / 2, CBORE_FOR_6_SOCKET_HEAD_CAP_SCREW4_CBORE_D / 2, CBORE_FOR_6_SOCKET_HEAD_CAP_SCREW4_CBORE_DEPTH)


solid = part.part
